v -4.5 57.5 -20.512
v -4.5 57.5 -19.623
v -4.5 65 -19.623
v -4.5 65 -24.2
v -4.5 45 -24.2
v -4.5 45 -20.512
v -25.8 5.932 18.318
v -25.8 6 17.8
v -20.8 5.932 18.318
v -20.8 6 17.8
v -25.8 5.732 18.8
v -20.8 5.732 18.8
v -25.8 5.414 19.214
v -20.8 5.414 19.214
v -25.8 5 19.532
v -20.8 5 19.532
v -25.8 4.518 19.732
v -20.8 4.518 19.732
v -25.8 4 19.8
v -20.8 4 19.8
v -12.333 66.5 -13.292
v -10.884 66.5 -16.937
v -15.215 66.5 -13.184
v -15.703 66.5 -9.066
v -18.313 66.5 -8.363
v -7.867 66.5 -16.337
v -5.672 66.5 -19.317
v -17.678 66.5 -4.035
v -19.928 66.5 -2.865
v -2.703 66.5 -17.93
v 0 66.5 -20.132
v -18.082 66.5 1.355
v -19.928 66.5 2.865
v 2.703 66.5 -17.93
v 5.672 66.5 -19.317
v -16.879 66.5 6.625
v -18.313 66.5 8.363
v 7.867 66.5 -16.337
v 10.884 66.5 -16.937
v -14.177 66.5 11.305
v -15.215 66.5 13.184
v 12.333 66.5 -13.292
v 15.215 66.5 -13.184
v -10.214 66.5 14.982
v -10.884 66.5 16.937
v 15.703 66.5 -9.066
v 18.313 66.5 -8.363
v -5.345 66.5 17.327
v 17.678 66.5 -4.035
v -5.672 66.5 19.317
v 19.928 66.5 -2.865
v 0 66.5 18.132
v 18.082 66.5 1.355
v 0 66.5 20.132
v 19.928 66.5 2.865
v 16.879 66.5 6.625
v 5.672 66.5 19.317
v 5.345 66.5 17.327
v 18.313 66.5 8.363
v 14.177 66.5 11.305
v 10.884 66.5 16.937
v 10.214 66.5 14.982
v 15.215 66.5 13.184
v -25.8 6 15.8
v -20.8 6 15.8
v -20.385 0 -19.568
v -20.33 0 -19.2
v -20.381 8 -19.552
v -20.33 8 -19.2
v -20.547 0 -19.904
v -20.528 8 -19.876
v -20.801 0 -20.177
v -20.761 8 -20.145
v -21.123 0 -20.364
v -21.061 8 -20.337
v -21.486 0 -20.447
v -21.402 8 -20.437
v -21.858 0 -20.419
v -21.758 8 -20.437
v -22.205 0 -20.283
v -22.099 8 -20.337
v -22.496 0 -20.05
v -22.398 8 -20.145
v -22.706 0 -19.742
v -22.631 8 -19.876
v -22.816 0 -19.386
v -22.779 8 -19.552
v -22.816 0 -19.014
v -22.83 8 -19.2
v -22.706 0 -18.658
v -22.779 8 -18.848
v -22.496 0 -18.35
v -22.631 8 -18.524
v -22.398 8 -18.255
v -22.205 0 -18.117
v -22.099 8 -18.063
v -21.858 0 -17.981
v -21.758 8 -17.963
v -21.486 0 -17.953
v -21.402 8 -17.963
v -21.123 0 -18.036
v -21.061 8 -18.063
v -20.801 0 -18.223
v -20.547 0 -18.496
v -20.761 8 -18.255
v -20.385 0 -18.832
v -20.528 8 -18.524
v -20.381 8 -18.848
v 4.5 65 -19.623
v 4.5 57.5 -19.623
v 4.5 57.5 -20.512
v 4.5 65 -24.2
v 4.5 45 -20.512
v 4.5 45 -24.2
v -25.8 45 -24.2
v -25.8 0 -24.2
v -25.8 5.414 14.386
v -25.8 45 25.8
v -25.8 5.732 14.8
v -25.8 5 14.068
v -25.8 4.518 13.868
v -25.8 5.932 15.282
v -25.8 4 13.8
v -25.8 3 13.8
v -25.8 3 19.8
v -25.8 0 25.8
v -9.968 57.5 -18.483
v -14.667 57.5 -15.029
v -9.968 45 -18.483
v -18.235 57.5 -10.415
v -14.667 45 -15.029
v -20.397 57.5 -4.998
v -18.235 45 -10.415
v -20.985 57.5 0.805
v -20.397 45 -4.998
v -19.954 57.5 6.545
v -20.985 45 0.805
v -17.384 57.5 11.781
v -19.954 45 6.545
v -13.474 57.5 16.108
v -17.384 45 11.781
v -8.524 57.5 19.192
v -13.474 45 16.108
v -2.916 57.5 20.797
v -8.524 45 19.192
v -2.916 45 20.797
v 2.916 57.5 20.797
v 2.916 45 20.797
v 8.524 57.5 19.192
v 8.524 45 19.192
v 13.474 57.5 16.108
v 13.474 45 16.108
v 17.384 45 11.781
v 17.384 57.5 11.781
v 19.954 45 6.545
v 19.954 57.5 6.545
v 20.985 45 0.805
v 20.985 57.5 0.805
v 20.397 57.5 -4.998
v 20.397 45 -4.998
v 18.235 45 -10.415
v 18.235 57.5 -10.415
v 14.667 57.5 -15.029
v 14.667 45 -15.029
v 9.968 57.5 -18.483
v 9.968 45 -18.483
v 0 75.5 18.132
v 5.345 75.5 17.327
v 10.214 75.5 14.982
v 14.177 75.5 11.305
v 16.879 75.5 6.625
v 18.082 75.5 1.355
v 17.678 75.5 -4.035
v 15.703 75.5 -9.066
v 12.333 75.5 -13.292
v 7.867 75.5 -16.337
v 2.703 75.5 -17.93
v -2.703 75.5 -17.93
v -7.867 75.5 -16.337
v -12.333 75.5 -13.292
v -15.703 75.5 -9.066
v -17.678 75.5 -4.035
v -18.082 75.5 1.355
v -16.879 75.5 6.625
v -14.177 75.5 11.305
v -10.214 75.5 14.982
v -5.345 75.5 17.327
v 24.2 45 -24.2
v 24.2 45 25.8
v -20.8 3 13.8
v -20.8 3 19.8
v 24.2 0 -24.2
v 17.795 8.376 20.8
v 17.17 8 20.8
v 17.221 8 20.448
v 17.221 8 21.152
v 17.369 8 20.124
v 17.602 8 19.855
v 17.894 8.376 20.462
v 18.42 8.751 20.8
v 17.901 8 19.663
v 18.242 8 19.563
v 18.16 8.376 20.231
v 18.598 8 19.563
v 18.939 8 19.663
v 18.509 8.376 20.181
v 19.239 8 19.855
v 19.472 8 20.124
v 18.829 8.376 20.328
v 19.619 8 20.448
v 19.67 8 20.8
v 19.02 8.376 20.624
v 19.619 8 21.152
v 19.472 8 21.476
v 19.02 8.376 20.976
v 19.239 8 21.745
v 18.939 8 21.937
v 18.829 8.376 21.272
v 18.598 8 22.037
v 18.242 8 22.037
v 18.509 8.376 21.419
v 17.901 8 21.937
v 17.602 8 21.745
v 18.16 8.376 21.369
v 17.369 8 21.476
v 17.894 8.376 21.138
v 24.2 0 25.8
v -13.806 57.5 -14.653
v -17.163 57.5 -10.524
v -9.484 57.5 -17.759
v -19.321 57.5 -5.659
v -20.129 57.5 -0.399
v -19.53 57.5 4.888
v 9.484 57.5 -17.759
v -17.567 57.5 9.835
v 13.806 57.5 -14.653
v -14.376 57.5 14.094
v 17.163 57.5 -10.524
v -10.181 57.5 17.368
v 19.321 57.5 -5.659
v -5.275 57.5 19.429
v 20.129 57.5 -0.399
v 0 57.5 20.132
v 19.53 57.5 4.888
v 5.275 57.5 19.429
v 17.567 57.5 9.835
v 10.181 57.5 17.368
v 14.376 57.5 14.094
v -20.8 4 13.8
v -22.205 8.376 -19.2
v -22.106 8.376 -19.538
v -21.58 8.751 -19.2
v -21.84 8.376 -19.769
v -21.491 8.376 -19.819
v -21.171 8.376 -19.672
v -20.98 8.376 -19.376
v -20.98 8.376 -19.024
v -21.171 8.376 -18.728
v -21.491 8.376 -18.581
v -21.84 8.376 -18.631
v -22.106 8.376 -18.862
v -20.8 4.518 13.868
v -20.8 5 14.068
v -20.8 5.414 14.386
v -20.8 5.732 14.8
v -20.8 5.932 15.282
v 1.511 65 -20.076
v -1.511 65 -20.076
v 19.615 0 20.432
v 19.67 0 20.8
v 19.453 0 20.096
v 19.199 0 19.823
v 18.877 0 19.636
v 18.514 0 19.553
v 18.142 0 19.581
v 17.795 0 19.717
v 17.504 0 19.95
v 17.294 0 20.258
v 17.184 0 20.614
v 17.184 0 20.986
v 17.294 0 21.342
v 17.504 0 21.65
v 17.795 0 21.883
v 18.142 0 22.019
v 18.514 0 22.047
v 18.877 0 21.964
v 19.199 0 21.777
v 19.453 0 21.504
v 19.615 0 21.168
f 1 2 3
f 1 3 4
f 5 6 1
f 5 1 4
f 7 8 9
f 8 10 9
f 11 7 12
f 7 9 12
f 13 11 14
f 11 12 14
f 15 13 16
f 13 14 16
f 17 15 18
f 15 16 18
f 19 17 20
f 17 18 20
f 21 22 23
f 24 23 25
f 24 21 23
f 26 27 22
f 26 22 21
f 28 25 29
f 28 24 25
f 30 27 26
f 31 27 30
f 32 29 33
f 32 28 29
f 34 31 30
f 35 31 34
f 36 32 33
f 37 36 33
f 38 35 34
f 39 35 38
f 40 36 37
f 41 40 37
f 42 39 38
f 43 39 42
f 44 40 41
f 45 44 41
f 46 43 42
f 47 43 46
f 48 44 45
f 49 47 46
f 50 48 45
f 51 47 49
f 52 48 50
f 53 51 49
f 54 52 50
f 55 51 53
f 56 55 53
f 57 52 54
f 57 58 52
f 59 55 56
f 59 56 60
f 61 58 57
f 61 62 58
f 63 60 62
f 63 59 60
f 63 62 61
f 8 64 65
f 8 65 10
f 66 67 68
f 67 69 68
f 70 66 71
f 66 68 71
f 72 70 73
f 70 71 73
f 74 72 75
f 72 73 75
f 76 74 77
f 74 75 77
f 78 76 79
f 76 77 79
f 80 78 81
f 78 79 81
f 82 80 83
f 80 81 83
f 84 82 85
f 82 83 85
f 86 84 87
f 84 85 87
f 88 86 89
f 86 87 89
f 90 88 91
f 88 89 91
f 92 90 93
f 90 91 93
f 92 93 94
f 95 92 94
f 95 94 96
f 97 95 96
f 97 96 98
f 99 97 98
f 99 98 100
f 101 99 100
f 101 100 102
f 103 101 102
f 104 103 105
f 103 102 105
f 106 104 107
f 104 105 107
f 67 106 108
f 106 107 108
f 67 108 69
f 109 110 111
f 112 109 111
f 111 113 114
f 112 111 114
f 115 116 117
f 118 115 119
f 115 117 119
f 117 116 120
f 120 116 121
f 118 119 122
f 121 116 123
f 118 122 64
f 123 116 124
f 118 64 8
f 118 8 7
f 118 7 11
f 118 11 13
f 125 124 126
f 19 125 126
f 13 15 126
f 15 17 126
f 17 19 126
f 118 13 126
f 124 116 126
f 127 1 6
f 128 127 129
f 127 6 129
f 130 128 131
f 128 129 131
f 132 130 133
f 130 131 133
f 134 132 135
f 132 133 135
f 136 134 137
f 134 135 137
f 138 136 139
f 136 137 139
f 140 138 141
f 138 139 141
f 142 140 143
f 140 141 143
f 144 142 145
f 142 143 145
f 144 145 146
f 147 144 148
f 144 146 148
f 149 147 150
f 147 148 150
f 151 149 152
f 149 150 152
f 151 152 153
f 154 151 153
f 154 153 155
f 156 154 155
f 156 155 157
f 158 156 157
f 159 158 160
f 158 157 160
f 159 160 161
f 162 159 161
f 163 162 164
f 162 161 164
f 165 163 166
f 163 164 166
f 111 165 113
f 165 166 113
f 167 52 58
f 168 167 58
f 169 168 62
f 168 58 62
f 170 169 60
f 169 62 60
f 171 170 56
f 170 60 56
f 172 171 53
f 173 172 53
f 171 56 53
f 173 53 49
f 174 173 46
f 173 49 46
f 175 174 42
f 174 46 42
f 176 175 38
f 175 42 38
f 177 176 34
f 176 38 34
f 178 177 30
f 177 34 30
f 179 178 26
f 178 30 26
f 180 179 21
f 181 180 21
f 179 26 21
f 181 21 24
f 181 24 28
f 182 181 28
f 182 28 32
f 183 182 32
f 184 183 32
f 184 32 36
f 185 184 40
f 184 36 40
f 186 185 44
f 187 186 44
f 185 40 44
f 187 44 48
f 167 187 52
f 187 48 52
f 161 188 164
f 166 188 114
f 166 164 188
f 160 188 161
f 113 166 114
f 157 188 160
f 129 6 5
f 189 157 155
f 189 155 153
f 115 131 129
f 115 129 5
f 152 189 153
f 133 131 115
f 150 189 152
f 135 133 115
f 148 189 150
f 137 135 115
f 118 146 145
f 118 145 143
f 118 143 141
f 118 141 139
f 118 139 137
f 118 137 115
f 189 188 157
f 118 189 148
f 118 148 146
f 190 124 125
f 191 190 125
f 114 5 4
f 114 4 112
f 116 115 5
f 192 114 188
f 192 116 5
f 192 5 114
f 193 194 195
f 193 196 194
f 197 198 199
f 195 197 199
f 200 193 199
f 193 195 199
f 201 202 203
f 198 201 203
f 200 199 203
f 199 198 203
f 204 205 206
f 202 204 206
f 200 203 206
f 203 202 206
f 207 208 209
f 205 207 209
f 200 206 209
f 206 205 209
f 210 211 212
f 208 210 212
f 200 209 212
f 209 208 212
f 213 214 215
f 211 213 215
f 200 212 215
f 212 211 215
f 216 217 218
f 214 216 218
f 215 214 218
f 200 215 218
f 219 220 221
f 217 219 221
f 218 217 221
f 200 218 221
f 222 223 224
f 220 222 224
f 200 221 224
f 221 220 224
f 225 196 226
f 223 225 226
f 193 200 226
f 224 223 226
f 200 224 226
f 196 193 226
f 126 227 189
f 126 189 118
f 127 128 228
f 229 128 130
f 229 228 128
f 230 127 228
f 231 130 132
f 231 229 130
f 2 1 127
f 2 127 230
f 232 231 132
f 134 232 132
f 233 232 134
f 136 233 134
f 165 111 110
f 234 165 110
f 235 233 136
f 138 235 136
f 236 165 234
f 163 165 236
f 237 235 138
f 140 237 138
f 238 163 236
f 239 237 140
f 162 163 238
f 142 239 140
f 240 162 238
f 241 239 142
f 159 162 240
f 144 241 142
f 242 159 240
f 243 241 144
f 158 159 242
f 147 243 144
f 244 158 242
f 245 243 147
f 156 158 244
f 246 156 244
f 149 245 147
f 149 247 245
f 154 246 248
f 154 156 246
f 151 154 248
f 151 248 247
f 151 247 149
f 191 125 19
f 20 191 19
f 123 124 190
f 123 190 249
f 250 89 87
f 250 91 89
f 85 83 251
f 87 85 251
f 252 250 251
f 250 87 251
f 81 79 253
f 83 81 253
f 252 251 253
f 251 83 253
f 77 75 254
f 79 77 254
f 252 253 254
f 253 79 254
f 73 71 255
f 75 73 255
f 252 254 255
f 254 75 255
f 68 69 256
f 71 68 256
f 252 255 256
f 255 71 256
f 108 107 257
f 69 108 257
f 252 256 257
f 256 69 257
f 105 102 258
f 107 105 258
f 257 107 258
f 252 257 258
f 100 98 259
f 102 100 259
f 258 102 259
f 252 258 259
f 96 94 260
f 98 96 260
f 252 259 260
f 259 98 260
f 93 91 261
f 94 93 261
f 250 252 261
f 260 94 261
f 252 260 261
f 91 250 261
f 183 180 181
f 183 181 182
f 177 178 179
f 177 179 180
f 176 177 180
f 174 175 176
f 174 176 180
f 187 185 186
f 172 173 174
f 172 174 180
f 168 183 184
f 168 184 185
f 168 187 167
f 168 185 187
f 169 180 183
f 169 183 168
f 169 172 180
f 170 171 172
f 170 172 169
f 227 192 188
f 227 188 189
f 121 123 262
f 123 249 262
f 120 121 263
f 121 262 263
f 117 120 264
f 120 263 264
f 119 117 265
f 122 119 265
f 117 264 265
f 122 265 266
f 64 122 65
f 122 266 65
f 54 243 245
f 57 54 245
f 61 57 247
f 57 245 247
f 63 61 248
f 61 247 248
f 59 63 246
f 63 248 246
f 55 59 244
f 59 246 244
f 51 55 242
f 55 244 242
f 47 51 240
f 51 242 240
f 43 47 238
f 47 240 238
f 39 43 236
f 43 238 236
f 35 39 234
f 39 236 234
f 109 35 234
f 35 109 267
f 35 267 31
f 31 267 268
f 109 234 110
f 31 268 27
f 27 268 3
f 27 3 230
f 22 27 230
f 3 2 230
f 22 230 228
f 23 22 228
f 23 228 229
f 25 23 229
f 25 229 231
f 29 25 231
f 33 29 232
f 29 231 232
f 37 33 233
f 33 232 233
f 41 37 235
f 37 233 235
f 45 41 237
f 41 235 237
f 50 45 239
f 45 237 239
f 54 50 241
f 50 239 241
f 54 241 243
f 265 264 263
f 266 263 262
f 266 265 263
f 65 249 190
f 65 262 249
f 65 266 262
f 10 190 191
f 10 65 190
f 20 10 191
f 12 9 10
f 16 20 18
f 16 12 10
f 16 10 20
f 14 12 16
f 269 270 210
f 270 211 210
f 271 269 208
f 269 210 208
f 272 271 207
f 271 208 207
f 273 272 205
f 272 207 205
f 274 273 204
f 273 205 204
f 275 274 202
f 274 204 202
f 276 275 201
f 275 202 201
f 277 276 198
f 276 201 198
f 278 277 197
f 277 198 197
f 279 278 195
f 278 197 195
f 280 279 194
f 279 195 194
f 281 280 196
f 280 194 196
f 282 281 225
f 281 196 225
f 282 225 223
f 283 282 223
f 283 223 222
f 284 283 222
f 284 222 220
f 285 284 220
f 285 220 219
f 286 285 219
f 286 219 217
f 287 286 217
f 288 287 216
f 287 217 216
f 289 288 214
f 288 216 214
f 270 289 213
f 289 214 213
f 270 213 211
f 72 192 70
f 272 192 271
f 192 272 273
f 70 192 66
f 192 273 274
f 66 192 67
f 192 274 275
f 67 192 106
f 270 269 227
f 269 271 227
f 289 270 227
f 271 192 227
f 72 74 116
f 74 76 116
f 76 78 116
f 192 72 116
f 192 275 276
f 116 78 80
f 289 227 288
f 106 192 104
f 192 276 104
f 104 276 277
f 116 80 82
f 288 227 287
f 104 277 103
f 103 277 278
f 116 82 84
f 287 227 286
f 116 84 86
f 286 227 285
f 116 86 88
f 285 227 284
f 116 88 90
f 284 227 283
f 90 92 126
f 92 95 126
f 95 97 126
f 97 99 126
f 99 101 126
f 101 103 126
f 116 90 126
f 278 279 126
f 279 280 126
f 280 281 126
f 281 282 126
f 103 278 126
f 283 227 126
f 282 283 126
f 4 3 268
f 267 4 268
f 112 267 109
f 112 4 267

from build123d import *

# Parameters (mm, degrees)
SKETCH1_W        = 50
SKETCH1_H        = 50
EXTRUSION1_DEPTH = 45
SKETCH2_R        = 21
EXTRUSION2_DEPTH = 12.5
SKETCH3_R        = 20.13248881
EXTRUSION3_DEPTH = 9
SKETCH4_R        = 18.13248881
EXTRUSION4_DEPTH = 9
SKETCH5_W        = 9
SKETCH5_H        = 10.2
EXTRUSION5_DEPTH = 20
HOLE1_D          = 2.5
HOLE1_DEPTH      = 8
HOLE1_TIP        = 0.751075774
SKETCH8_W        = 6
SKETCH8_H        = 3
EXTRUSION6_DEPTH = 5
FILLET1_R        = 2


with BuildPart() as part:
    # Sketch1 → Extrusion1 (new body)
    with BuildSketch(Plane(origin=(0, 0, 0), x_dir=(-1, 0, 0), z_dir=(0, 1, 0))):
        with Locations((0.8, 0.8)):
            Rectangle(SKETCH1_W, SKETCH1_H)
    extrude(amount=EXTRUSION1_DEPTH)

    # Sketch2 → Extrusion2 (add)
    with BuildSketch(Plane(origin=(0, 45, 0), x_dir=(-1, 0, 0), z_dir=(0, 1, 0))):
        with Locations(Location((0, 0, 0), (0, 0, 90))):
            Circle(SKETCH2_R)
    extrude(amount=EXTRUSION2_DEPTH)

    # Sketch3 → Extrusion3 (add)
    with BuildSketch(Plane(origin=(0, 57.5, 0), x_dir=(-1, 0, 0), z_dir=(0, 1, 0))):
        with Locations(Location((0, 0, 0), (0, 0, 90))):
            Circle(SKETCH3_R)
    extrude(amount=EXTRUSION3_DEPTH)

    # Sketch4 → Extrusion4 (add)
    with BuildSketch(Plane(origin=(0, 66.5, 0), x_dir=(-1, 0, 0), z_dir=(0, 1, 0))):
        with Locations(Location((0, 0, 0), (0, 0, 90))):
            Circle(SKETCH4_R)
    extrude(amount=EXTRUSION4_DEPTH)

    # Sketch5 → Extrusion5 (add)
    with BuildSketch(Plane(origin=(0, 45, 0), x_dir=(1, 0, 0), z_dir=(0, 1, 0))):
        with Locations((0, 19.1)):
            Rectangle(SKETCH5_W, SKETCH5_H)
    extrude(amount=EXTRUSION5_DEPTH)

    # Hole1
    with Locations(Plane(origin=(0, 0, 0), x_dir=(-1, 0, 0), z_dir=(0, -1, 0))):
        with Locations((-18.420088858, -20.8), (21.579911142, 19.2)):
            Hole(HOLE1_D / 2, depth=HOLE1_DEPTH)
            with Locations((0, 0, -(HOLE1_DEPTH + HOLE1_TIP / 2))):  # 118° drill point
                Cone(0, HOLE1_D / 2, HOLE1_TIP, mode=Mode.SUBTRACT)

    # Sketch8 → Extrusion6 (cut)
    with BuildSketch(Plane.ZY.offset(25.8)):
        with Locations((16.8, 4.5)):
            Rectangle(SKETCH8_W, SKETCH8_H)
    extrude(amount=-EXTRUSION6_DEPTH, mode=Mode.SUBTRACT)

    # Fillet1
    fillet1_edges = [part.edges().sort_by_distance(p)[0] for p in [
        (-23.3, 6, 13.8),
        (-23.3, 6, 19.8),
    ]]
    fillet(fillet1_edges, radius=FILLET1_R)


solid = part.part
